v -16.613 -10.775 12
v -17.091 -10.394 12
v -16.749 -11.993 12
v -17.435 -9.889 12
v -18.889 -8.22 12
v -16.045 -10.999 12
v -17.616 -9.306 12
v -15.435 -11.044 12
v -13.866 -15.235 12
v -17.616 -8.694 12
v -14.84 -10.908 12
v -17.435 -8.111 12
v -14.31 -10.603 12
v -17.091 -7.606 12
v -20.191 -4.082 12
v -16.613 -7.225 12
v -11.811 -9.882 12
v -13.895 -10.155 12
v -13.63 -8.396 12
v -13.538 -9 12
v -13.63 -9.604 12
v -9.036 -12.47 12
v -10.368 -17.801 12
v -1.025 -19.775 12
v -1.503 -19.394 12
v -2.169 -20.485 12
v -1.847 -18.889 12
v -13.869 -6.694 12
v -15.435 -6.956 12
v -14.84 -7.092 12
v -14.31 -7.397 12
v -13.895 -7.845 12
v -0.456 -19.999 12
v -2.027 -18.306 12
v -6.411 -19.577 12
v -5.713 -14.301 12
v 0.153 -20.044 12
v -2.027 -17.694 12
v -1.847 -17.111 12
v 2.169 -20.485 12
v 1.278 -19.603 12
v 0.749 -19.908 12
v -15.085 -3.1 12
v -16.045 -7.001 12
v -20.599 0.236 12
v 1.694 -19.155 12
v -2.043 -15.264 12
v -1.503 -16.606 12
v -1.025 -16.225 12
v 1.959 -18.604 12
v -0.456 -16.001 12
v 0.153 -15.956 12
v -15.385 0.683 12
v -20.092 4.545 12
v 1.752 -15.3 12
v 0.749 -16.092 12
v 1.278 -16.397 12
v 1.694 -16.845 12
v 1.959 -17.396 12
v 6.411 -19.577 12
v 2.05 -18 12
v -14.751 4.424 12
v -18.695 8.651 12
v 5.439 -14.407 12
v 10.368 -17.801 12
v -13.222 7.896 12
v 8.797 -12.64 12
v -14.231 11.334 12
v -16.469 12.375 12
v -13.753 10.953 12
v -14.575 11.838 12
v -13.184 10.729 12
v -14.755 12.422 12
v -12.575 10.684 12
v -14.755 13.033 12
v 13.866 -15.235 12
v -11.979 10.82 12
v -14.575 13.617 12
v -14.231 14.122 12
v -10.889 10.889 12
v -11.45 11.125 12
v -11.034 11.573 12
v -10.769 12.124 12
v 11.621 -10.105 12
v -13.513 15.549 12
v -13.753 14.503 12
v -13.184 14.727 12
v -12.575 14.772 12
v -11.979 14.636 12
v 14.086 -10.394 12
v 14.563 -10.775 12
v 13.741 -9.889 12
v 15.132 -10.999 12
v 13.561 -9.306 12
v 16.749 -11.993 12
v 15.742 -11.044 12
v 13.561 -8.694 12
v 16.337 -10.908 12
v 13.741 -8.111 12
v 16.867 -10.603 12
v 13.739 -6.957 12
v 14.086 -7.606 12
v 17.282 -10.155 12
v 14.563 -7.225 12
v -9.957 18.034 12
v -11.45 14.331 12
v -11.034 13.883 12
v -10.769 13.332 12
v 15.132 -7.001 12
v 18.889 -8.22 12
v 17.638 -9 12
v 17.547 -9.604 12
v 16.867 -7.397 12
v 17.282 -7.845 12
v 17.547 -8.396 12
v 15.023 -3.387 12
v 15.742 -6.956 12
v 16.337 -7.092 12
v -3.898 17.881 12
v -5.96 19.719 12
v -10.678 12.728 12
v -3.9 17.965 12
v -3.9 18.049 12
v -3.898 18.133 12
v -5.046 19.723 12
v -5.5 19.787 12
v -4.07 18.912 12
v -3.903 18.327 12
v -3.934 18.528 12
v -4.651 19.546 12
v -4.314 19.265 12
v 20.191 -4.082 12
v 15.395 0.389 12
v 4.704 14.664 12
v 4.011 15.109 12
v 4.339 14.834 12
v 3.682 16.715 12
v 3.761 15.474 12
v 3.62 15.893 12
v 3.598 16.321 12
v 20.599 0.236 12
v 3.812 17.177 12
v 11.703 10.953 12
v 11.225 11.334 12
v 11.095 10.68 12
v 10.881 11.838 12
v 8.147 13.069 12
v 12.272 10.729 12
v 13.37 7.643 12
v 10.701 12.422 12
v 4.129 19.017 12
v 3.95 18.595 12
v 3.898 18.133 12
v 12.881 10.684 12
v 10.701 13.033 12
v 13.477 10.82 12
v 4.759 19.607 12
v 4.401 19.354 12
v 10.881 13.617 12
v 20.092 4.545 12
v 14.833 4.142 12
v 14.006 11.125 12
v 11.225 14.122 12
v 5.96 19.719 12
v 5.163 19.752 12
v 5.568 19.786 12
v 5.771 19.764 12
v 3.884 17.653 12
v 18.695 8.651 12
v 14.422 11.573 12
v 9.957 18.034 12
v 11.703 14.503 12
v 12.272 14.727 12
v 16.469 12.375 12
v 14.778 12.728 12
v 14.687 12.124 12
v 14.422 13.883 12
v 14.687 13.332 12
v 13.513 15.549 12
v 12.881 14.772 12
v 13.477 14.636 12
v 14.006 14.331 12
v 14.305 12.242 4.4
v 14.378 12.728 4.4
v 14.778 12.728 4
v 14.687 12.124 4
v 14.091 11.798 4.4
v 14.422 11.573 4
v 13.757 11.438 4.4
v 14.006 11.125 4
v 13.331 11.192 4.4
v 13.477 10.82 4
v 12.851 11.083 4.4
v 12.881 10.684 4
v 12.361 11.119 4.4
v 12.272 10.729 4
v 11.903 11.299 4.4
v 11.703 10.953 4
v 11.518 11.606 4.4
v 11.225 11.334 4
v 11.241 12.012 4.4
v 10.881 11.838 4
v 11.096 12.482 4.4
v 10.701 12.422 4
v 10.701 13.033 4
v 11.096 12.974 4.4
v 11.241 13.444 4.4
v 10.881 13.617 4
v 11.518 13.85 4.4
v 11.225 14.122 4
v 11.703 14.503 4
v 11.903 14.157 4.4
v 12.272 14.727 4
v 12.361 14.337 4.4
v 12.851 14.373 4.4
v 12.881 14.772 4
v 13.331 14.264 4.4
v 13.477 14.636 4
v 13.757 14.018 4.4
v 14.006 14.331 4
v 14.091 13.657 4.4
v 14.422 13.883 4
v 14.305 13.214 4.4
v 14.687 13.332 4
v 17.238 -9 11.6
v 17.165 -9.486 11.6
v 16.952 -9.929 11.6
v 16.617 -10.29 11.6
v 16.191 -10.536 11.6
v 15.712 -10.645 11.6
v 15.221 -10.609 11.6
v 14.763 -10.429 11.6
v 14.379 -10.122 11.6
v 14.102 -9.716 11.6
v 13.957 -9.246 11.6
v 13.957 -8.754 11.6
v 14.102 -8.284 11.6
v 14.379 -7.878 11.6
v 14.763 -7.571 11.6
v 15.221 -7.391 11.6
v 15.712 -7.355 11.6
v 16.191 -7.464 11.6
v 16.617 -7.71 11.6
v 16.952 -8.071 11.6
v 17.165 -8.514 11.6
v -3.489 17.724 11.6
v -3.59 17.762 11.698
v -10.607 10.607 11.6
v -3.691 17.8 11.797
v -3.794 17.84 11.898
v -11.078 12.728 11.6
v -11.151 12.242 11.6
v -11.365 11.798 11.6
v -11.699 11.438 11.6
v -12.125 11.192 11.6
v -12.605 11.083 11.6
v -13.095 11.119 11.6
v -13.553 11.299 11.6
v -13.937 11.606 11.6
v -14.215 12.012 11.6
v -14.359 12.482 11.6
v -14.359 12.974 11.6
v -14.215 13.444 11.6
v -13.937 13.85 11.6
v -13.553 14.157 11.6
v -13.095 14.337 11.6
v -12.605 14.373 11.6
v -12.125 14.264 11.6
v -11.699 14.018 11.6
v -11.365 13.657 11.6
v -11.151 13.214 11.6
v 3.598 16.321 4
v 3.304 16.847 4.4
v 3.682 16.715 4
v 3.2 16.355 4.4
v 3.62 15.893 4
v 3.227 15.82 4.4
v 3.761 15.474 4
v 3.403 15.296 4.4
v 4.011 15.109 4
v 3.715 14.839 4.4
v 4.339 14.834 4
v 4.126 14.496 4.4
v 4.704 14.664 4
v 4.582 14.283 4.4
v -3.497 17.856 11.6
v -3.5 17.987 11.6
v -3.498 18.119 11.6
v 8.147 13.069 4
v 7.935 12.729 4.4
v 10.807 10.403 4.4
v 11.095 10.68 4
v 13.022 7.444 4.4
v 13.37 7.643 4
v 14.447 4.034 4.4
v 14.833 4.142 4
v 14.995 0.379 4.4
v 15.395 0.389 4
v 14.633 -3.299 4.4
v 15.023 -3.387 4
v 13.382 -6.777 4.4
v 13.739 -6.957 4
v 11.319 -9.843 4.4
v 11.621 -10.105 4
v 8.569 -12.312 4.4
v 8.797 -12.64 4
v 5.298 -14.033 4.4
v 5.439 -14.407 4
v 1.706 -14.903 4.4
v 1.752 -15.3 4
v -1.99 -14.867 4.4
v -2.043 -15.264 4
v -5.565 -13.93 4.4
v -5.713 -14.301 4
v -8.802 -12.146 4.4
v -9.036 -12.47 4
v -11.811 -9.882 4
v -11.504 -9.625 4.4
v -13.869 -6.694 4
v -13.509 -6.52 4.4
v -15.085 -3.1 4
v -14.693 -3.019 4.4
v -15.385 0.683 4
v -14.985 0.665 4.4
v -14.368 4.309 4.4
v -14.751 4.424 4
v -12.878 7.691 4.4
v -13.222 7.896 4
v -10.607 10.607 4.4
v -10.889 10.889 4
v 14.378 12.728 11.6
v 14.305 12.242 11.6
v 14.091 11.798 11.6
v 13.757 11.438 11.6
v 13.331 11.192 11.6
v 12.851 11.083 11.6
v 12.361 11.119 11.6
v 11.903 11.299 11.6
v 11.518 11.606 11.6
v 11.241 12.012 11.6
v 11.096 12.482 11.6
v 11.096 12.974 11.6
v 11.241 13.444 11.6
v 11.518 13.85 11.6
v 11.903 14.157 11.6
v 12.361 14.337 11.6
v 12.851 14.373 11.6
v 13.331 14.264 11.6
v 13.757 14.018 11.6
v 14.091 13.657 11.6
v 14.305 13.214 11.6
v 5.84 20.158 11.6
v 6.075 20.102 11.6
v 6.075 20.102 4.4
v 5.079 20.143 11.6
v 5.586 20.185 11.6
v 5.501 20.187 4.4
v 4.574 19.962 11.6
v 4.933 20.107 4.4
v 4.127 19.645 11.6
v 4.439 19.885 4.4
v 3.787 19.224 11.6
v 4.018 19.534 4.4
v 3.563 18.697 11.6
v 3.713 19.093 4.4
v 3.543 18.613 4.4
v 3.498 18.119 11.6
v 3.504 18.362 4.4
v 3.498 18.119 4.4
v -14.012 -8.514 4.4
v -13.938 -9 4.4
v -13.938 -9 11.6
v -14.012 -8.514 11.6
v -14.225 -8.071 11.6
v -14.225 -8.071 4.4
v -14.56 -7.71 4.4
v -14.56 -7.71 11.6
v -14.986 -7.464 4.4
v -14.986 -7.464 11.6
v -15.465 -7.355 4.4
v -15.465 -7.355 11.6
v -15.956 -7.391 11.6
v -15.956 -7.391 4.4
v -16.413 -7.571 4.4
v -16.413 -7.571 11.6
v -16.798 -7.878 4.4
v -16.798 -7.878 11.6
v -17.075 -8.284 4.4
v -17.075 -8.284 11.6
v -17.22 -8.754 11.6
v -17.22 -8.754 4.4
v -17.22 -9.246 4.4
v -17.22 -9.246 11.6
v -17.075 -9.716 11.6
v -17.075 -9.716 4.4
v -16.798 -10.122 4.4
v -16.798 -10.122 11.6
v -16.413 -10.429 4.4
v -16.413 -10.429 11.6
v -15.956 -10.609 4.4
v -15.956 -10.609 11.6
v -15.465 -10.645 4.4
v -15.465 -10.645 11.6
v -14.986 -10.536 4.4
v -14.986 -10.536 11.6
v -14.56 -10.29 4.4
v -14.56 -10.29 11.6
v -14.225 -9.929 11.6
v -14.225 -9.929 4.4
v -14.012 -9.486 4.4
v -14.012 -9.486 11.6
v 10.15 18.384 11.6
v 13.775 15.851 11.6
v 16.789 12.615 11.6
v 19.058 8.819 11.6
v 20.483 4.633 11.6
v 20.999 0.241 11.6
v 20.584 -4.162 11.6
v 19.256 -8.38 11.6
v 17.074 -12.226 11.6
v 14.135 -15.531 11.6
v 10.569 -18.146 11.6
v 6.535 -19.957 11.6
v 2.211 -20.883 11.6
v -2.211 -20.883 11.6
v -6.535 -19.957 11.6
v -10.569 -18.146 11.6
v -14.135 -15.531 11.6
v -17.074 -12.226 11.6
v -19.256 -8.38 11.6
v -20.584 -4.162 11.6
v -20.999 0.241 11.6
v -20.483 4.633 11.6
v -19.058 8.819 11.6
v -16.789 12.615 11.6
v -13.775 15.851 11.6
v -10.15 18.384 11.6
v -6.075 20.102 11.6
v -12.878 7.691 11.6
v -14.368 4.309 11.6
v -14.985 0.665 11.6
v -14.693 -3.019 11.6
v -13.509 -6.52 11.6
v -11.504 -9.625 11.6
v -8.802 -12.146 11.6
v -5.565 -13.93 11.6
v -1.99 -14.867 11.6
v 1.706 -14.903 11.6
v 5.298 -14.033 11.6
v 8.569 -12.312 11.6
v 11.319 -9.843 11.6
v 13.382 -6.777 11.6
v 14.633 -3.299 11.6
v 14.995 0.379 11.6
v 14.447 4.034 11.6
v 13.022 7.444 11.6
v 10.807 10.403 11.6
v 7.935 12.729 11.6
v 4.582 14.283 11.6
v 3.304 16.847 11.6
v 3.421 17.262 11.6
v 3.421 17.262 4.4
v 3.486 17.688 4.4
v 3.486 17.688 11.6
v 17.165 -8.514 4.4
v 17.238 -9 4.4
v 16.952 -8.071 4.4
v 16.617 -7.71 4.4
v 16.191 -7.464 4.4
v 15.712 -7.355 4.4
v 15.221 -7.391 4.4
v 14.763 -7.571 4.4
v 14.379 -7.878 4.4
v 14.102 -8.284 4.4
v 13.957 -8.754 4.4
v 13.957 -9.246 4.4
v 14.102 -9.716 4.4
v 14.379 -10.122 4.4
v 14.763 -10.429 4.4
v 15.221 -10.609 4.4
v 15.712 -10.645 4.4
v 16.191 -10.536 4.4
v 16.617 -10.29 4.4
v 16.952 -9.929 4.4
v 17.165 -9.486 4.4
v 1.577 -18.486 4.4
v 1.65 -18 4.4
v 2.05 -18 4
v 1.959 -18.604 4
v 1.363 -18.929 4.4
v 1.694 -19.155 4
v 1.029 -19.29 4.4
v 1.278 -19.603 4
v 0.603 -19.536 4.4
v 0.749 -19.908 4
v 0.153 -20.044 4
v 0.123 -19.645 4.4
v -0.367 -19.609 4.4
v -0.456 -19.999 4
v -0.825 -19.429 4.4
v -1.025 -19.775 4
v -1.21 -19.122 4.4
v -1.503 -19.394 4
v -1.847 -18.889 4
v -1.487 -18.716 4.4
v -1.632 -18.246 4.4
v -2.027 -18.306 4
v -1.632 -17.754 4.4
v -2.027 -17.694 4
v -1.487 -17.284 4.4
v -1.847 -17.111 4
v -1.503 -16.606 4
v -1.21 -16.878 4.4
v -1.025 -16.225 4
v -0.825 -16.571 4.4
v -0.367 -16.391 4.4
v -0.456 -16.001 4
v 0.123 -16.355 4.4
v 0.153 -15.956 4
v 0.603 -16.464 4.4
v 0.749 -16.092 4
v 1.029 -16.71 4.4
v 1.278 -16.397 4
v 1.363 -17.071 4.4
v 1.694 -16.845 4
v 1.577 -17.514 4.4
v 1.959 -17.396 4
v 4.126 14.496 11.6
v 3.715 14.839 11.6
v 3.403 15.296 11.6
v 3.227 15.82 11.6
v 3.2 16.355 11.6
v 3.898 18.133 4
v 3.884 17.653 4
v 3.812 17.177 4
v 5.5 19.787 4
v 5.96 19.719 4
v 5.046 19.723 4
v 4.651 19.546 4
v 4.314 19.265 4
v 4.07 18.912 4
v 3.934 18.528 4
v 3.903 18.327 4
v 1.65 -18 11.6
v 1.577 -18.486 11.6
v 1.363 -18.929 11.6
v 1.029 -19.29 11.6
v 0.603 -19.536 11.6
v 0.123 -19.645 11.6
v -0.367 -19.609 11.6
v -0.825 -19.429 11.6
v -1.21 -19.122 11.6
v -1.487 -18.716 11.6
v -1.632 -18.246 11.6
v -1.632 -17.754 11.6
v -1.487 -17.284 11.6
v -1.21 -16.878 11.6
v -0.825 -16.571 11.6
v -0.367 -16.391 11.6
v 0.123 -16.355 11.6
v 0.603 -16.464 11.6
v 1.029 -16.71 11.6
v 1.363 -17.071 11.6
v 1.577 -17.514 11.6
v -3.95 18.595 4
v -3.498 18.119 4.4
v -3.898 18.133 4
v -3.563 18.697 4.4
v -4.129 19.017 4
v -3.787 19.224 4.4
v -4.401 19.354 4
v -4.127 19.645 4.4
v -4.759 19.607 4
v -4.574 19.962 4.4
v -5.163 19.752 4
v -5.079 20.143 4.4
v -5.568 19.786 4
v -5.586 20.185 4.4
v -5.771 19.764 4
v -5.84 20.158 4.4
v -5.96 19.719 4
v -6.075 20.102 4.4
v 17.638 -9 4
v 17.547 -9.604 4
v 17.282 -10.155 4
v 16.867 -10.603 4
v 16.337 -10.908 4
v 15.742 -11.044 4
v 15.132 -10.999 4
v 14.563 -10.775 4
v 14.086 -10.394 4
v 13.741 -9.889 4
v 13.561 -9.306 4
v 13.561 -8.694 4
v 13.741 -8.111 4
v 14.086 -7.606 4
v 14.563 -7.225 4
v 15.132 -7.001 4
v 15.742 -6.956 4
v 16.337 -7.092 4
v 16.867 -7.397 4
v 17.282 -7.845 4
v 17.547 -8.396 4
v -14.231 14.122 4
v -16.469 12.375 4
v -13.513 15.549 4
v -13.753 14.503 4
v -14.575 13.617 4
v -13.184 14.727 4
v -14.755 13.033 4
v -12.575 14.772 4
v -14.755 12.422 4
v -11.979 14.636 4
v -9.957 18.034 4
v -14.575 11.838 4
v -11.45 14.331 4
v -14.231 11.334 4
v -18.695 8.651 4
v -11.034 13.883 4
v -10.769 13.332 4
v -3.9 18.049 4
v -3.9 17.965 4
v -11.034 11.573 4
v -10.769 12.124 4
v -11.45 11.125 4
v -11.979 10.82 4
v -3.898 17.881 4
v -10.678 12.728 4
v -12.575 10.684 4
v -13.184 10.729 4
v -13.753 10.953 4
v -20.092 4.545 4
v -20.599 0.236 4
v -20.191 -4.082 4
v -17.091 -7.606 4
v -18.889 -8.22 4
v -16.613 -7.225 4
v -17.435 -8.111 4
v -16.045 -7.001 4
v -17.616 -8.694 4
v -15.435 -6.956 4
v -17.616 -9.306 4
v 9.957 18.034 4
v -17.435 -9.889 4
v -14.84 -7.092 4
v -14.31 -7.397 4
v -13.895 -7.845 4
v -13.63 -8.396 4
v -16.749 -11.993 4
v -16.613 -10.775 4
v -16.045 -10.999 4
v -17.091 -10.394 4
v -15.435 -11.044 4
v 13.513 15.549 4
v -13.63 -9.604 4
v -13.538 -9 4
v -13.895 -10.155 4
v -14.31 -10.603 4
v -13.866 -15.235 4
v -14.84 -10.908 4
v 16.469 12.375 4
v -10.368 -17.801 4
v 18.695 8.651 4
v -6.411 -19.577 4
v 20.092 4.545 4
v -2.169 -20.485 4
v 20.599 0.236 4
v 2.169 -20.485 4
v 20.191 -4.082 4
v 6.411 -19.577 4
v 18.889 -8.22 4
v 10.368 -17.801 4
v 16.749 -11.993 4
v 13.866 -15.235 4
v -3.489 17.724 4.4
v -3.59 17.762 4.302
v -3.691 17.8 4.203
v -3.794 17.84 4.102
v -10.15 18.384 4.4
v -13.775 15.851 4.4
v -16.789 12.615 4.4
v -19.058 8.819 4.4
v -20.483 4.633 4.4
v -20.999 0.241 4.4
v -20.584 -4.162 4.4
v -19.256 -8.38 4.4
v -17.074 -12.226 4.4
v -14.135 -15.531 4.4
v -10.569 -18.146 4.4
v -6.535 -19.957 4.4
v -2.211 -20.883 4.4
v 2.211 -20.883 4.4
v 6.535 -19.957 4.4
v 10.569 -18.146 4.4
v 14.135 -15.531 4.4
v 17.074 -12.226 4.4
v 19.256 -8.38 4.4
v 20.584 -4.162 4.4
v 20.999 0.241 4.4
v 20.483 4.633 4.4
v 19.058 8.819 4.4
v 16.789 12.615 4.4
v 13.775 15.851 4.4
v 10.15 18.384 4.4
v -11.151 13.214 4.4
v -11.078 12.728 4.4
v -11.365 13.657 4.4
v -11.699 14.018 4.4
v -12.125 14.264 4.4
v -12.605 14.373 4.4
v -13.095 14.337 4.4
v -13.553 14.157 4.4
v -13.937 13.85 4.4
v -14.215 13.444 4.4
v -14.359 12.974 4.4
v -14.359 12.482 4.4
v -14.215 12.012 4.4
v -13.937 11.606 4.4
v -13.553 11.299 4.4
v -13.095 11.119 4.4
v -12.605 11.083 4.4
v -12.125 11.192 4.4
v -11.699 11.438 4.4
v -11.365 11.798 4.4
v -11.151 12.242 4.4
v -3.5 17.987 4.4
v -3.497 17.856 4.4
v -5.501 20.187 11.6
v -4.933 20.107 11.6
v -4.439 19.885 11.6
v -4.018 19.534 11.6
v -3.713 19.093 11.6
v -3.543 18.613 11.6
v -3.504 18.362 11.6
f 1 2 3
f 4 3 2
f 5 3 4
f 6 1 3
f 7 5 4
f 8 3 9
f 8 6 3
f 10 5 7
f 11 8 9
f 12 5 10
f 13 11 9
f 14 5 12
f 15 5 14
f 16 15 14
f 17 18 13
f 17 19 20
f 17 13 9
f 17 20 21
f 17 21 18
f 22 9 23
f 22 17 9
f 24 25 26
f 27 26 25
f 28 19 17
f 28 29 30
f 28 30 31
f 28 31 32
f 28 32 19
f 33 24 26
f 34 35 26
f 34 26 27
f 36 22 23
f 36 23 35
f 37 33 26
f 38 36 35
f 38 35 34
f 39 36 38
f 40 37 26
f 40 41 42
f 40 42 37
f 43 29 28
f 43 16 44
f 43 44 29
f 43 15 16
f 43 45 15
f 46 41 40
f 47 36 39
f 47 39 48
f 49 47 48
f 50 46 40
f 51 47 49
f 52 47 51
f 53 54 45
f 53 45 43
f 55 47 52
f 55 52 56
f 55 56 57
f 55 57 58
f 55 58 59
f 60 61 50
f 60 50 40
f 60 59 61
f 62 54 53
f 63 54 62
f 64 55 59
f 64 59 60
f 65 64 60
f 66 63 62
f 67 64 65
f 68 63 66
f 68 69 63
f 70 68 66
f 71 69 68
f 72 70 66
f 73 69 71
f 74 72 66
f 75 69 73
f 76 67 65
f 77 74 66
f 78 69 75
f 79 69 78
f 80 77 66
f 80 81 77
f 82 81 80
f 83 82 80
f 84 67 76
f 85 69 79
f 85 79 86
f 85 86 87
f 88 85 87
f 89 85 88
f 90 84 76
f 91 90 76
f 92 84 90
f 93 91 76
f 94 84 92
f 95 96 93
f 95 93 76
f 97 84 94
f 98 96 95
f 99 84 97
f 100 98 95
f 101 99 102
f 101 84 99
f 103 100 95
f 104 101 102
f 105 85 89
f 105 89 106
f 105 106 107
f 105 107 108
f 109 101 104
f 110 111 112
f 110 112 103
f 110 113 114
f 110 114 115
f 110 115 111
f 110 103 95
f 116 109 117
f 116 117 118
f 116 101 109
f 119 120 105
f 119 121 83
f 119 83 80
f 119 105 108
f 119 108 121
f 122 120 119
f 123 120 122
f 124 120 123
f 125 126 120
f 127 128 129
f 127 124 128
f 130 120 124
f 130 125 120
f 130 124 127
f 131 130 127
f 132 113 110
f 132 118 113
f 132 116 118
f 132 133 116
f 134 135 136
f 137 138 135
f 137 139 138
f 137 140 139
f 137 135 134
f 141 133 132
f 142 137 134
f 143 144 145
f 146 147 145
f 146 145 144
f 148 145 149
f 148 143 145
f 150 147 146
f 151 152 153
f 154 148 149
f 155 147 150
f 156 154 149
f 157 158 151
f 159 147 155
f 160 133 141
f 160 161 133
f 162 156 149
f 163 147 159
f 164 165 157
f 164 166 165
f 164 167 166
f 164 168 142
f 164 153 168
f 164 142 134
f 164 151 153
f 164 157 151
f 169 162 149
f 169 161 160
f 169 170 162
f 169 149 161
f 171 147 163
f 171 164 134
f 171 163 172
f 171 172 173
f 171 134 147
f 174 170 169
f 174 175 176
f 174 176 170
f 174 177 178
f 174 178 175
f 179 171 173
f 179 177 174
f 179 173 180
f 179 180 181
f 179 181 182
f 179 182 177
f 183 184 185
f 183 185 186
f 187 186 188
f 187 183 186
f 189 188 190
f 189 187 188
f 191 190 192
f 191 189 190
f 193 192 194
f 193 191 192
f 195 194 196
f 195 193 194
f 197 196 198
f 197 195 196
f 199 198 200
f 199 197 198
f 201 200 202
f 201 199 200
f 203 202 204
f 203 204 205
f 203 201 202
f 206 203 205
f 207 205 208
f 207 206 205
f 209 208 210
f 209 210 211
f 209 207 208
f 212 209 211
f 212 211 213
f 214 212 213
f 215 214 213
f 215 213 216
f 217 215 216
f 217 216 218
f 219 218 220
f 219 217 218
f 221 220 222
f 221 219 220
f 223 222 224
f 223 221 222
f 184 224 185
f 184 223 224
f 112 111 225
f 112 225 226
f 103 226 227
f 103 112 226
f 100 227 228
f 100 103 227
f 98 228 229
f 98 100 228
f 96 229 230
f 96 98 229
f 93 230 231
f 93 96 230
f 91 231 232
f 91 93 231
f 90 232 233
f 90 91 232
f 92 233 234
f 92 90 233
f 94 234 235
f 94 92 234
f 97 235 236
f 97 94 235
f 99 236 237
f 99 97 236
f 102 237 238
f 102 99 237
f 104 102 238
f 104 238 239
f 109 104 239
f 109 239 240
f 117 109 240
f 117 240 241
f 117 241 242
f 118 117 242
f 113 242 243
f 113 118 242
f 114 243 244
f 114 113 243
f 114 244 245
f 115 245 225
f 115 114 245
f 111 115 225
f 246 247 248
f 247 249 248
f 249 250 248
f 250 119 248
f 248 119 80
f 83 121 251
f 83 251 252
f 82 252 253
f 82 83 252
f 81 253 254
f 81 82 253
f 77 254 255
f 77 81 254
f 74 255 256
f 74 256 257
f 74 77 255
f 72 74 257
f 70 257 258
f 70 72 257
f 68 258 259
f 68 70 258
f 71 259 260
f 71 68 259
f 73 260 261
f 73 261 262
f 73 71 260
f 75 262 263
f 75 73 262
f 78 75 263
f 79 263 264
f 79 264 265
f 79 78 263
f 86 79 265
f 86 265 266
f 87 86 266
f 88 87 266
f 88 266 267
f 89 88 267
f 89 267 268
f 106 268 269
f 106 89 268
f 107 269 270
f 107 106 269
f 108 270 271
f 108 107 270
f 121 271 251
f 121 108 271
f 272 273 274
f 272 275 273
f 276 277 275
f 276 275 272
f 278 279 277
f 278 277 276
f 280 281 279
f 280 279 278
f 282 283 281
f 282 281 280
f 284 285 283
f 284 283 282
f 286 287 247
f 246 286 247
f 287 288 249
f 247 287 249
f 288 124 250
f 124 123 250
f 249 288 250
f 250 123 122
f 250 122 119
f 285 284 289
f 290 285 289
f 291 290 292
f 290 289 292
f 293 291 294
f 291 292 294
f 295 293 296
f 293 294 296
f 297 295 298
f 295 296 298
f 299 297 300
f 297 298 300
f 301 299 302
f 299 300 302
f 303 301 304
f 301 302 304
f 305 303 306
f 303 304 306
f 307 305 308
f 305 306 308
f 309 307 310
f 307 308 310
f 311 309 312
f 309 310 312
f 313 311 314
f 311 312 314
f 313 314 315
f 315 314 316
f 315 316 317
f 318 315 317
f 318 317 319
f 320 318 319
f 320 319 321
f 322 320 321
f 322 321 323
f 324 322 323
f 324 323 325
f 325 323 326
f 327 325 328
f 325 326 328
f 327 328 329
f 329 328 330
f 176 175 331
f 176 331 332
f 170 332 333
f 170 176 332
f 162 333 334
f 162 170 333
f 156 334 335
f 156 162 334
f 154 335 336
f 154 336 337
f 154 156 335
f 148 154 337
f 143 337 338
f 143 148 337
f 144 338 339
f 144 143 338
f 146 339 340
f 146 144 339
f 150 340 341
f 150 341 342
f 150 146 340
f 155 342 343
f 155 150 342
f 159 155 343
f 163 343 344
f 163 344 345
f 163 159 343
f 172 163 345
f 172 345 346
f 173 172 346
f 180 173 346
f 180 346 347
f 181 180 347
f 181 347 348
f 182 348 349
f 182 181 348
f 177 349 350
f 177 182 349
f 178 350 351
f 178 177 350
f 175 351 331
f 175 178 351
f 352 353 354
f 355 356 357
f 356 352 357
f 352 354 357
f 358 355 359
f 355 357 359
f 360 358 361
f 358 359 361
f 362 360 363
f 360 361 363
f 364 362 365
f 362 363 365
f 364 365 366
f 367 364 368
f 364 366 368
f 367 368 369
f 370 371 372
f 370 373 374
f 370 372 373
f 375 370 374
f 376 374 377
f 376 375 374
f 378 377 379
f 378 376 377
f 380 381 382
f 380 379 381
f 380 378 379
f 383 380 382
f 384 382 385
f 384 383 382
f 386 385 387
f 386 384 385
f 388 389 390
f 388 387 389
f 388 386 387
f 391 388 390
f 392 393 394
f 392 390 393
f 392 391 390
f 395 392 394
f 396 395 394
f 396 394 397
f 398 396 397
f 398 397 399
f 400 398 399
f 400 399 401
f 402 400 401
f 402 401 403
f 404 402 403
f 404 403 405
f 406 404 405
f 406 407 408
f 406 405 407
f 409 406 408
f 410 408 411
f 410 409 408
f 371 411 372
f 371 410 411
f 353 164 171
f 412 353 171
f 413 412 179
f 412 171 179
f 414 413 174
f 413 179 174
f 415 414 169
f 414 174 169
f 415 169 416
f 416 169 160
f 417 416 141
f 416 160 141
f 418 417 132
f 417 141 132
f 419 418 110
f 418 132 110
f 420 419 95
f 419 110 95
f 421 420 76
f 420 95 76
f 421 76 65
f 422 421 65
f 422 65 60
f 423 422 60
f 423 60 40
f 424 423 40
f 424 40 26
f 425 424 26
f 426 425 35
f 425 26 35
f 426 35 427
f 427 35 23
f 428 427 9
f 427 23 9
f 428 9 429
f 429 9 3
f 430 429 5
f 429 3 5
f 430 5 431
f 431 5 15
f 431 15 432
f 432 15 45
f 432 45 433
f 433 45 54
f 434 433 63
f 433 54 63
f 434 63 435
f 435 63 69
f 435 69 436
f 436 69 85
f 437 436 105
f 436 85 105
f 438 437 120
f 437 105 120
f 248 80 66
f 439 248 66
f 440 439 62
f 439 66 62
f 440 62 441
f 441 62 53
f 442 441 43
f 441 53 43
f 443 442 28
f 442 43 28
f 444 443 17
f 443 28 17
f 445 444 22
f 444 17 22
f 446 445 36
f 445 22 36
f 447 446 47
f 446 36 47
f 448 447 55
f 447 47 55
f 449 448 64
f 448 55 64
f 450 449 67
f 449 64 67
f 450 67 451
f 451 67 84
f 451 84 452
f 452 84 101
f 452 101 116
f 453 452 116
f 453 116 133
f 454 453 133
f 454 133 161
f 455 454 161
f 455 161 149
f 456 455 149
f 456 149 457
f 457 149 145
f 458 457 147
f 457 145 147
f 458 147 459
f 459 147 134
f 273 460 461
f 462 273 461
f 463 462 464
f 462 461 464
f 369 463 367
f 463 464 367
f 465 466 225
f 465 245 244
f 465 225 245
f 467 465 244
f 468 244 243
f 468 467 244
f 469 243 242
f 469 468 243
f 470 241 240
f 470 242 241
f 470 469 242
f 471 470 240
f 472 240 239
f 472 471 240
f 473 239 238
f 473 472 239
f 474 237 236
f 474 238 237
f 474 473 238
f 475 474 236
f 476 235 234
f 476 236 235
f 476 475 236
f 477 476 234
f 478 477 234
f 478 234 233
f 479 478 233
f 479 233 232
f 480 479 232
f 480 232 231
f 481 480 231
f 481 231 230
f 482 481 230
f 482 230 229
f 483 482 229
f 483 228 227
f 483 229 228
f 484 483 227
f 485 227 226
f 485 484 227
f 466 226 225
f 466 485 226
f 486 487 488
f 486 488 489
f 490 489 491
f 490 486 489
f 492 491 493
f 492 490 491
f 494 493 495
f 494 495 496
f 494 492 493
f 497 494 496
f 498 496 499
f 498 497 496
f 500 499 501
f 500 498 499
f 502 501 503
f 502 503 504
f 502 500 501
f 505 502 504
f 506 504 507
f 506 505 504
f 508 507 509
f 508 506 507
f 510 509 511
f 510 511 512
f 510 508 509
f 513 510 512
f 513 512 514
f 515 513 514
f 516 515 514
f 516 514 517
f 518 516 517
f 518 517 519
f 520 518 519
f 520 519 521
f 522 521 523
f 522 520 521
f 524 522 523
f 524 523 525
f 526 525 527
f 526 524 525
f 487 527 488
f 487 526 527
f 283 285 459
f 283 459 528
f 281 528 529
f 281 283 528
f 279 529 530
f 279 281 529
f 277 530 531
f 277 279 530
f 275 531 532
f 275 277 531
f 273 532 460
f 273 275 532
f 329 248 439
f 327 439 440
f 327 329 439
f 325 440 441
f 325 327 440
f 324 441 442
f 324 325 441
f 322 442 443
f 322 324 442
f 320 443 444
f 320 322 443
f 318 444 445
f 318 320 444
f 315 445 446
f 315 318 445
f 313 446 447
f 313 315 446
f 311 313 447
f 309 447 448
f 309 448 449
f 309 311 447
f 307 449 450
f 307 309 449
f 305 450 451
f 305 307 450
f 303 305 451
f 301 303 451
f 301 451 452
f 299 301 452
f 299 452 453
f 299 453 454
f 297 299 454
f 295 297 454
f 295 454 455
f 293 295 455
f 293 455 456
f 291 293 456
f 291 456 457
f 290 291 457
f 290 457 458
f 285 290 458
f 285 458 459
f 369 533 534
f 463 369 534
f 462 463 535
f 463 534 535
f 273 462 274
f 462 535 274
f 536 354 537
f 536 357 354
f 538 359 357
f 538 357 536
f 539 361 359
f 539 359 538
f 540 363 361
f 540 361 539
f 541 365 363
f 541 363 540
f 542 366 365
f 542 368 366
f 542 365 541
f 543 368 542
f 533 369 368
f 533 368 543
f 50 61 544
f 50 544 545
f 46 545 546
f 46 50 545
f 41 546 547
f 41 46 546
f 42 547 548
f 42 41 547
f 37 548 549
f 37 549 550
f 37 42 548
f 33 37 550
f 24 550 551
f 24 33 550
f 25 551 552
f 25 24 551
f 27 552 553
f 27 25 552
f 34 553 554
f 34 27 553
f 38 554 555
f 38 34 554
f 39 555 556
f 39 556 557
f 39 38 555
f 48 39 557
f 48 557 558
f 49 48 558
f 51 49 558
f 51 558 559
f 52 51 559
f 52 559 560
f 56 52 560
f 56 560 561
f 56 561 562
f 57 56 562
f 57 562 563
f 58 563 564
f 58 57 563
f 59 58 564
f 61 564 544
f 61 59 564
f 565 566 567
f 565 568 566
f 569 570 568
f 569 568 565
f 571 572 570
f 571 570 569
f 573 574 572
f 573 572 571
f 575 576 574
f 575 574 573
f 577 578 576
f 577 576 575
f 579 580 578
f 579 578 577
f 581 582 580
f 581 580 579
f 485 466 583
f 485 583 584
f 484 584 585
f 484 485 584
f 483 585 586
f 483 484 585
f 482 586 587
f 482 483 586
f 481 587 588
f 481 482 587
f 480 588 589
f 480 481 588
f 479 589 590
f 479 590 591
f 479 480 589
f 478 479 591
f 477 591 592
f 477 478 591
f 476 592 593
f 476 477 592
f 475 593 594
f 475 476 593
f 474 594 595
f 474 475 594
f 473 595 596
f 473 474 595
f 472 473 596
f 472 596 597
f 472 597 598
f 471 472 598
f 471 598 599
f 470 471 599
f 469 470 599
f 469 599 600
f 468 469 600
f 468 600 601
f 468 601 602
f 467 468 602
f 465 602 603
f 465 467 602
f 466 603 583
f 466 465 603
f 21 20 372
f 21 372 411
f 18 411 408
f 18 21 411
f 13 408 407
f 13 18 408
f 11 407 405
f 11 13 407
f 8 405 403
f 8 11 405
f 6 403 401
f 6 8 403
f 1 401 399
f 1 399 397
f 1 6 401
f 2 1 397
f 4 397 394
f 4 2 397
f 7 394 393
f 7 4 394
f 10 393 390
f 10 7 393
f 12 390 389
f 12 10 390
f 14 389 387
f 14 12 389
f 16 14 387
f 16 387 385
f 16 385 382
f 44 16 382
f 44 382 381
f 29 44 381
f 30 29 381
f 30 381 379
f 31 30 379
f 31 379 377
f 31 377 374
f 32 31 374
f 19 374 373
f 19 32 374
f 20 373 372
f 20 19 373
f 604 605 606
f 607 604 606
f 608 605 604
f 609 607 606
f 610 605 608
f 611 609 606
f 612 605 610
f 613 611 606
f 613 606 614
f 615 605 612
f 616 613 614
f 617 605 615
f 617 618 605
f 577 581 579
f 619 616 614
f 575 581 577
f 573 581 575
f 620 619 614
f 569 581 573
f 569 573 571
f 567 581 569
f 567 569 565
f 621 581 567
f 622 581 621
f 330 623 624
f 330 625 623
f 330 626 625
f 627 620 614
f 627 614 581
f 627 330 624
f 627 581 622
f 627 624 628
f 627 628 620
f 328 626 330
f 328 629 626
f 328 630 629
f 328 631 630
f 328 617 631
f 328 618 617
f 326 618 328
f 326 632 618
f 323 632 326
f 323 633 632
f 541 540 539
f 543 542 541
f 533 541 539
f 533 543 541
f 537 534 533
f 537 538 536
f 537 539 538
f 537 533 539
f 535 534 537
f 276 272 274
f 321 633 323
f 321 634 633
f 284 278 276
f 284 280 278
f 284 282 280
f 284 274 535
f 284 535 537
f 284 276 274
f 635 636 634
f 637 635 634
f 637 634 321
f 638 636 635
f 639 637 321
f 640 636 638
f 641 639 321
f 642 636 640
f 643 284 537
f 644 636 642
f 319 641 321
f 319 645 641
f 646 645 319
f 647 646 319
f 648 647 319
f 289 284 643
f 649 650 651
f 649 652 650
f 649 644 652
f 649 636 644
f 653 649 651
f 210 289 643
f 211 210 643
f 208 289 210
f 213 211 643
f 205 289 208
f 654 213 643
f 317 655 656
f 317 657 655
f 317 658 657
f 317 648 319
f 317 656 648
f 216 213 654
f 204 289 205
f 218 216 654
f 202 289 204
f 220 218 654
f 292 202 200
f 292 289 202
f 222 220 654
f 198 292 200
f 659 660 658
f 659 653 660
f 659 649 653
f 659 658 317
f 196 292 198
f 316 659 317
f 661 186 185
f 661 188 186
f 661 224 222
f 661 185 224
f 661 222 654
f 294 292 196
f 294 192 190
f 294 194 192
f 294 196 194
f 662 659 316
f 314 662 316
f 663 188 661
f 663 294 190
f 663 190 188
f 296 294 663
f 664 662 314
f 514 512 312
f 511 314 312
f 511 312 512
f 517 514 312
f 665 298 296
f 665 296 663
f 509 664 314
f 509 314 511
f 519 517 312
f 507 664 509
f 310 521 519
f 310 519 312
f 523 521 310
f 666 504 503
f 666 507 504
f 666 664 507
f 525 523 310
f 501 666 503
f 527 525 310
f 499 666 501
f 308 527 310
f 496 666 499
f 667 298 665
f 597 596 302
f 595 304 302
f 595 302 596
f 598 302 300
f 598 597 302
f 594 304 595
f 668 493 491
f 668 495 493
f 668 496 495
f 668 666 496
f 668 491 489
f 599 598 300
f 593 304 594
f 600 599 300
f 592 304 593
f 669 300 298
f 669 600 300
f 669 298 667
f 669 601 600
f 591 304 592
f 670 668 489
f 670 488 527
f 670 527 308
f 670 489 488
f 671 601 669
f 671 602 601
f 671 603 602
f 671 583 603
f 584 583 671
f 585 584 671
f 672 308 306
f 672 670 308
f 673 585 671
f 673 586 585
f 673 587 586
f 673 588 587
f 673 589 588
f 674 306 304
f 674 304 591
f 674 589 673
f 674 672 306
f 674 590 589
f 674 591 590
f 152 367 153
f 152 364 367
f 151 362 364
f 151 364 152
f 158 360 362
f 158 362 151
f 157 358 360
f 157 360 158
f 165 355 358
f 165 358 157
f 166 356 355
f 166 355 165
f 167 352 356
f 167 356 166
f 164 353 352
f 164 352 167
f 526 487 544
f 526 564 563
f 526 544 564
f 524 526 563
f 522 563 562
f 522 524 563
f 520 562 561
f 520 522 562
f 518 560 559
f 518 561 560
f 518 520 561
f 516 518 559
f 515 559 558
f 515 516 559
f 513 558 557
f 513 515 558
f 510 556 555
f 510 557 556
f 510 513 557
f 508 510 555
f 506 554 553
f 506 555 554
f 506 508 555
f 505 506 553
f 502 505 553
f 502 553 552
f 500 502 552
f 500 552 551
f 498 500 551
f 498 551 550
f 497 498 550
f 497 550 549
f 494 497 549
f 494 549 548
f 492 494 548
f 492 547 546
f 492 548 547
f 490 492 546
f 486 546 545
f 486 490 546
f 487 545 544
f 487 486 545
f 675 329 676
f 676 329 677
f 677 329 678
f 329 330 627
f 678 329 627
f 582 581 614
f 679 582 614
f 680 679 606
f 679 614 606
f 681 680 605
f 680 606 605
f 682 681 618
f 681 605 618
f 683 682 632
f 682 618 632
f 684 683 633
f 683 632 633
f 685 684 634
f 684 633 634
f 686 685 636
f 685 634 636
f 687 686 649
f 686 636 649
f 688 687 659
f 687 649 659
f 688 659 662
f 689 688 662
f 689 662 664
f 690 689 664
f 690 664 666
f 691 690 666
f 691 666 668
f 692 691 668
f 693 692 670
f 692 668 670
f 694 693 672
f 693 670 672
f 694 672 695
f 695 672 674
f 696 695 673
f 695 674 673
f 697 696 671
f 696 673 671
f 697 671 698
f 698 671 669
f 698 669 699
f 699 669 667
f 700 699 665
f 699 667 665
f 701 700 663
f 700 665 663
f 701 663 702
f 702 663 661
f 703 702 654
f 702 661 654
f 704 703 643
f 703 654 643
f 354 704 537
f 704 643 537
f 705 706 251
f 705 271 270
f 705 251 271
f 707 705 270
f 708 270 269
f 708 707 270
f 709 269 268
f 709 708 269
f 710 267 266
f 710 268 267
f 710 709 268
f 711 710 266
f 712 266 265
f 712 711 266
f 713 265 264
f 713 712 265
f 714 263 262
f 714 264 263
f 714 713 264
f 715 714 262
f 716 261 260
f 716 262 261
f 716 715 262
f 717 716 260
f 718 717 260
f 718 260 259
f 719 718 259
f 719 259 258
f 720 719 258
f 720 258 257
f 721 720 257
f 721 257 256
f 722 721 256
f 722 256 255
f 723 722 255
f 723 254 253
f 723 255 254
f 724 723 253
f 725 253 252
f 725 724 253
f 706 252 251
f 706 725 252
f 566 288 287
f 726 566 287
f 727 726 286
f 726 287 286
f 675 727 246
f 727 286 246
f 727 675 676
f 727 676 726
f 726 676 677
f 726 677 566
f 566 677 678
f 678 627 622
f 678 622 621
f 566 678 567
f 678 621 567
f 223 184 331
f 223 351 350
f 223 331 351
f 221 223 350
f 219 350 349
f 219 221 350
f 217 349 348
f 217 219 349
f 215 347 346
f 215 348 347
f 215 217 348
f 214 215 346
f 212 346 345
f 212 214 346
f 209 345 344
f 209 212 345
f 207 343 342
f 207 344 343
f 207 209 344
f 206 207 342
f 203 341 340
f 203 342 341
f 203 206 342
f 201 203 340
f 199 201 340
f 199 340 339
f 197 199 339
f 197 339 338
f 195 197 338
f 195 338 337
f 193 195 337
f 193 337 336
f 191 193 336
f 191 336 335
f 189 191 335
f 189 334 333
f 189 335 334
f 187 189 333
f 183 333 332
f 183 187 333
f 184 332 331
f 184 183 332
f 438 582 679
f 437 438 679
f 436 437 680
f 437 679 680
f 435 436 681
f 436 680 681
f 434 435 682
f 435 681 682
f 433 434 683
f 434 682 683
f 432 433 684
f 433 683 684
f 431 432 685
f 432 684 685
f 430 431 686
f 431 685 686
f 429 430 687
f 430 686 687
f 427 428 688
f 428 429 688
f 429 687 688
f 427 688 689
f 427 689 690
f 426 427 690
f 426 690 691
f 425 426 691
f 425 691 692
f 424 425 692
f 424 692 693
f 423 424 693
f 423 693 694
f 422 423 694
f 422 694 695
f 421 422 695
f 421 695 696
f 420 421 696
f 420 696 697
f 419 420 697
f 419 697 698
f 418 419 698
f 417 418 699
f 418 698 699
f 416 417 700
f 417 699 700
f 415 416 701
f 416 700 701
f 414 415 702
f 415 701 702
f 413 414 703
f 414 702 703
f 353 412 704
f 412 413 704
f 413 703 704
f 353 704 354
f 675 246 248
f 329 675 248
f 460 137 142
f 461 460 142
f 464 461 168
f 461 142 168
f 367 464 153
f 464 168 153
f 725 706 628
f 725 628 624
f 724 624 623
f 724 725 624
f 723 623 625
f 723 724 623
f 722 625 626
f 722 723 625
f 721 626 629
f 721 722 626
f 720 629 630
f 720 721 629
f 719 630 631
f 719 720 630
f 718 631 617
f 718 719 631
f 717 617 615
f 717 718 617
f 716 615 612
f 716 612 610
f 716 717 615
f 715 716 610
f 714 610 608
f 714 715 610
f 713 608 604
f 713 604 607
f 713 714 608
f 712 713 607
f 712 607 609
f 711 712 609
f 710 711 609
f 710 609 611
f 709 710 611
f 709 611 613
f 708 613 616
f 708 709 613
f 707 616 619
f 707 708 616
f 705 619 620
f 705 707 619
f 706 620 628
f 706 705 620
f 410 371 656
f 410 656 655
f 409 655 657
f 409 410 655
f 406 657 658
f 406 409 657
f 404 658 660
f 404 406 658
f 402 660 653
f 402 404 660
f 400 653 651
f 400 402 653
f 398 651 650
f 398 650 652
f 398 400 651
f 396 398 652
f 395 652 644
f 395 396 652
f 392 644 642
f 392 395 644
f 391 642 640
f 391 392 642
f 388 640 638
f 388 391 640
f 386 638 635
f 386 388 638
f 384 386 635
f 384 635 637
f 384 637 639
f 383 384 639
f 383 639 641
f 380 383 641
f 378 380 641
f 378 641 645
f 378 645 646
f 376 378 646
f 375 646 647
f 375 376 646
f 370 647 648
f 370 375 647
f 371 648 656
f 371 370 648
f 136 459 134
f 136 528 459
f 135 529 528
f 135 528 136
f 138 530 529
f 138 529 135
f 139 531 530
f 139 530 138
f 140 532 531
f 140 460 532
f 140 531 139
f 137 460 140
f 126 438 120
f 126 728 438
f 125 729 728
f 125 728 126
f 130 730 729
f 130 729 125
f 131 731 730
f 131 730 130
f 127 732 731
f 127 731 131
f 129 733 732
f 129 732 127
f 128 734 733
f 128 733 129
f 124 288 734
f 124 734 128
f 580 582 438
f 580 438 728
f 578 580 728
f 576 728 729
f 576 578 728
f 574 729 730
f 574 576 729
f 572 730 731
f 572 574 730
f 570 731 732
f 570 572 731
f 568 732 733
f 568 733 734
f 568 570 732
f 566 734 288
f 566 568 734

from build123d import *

# Parameters (mm, degrees)
SKETCH_R                    = 21
PAD_DEPTH                   = 14
SKETCH001_R                 = 9.05
POCKET_DEPTH                = 4
SKETCH002_R                 = 8.05
POCKET001_DEPTH             = 14.001
SKETCH003_R                 = 15
POCKET002_DEPTH             = 8.001
POCKET003_DEPTH             = 8
SKETCH005_R                 = 3.5
POCKET004_DEPTH             = 8
FILLET_R                    = 2
SKETCH006_R                 = 4
PAD001_DEPTH                = 6
SKETCH007_R                 = 1.65
POCKET005_DEPTH             = 14.001
SKETCH046_R                 = 25
POCKET031_DEPTH             = 6
CHAMFER003068012002052_SIZE = 0.4


with BuildPart() as part:
    # Sketch → Pad (new body)
    with BuildSketch(Plane.XY):
        Circle(SKETCH_R)
    extrude(amount=PAD_DEPTH)

    # Sketch001 (on DatumPlane) → Pocket (cut)
    with BuildSketch(Plane.XY):
        Circle(SKETCH001_R)
    extrude(amount=POCKET_DEPTH, mode=Mode.SUBTRACT)

    # Sketch002 (on DatumPlane) → Pocket001 (cut, through all)
    with BuildSketch(Plane.XY):
        Circle(SKETCH002_R)
    extrude(amount=POCKET001_DEPTH, mode=Mode.SUBTRACT)

    # Sketch003 (on DatumPlane) → Pocket002 (cut, through all)
    with BuildSketch(Plane.XY.offset(6)):
        Circle(SKETCH003_R)
    extrude(amount=POCKET002_DEPTH, mode=Mode.SUBTRACT)

    # Sketch004 (on DatumPlane) → Pocket003 (cut)
    with BuildSketch(Plane.XY.offset(14)):
        Polygon((-10.606602, 10.606602), (0, 10.606602), (0, 21.213203), align=None)
    extrude(amount=-POCKET003_DEPTH, mode=Mode.SUBTRACT)

    # Sketch005 (on DatumPlane) → Pocket004 (cut)
    with BuildSketch(Plane.XY.offset(14)):
        with Locations((0, 18)):
            Circle(SKETCH005_R)
    extrude(amount=-POCKET004_DEPTH, mode=Mode.SUBTRACT)

    # Fillet
    fillet_edges = [part.edges().sort_by_distance(p)[0] for p in [
        (-1.945126, 20.909722, 10),
        (1.945126, 20.909722, 10),
        (1.643223, 14.909722, 10),
    ]]
    fillet(fillet_edges, radius=FILLET_R)

    # Sketch006 (on DatumPlane) → Pad001 (join)
    with BuildSketch(Plane.XY):
        with Locations((0, 18)):
            Circle(SKETCH006_R)
        with Locations((-12.727922, 12.727922)):
            Circle(SKETCH006_R)
        with Locations((12.727922, 12.727922)):
            Circle(SKETCH006_R)
        with Locations((-15.588457, -9)):
            Circle(SKETCH006_R)
        with Locations((15.588457, -9)):
            Circle(SKETCH006_R)
    extrude(amount=PAD001_DEPTH)

    # Sketch007 (on DatumPlane) → Pocket005 (cut, through all)
    with BuildSketch(Plane.XY):
        with Locations((-12.727922, 12.727922)):
            Circle(SKETCH007_R)
        with Locations((12.727922, 12.727922)):
            Circle(SKETCH007_R)
        with Locations((0, 18)):
            Circle(SKETCH007_R)
        with Locations((-15.588457, -9)):
            Circle(SKETCH007_R)
        with Locations((15.588457, -9)):
            Circle(SKETCH007_R)
        with Locations((0, -18)):
            Circle(SKETCH007_R)
    extrude(amount=POCKET005_DEPTH, mode=Mode.SUBTRACT)

    # Sketch046 (on Face5 of Pocket005) → Pocket031 (cut)
    with BuildSketch(Plane(origin=(0, 0, 0), x_dir=(1, 0, 0), z_dir=(0, 0, -1))):
        Circle(SKETCH046_R)
    extrude(amount=-POCKET031_DEPTH, mode=Mode.SUBTRACT)

    # Chamfer003068012002052
    chamfer003068012002052_edges = [part.edges().sort_by_distance(p)[0] for p in [
        (-3.499121, 17.921582, 14),
        (-4.27738, 19.772747, 14),
        (-7.047855, 14.165348, 14),
        (-12.518313, -16.860956, 14),
        (-5.740251, -13.858193, 14),
        (16.860956, 12.518313, 14),
        (12.118742, 8.839462, 14),
        (4.27738, 19.772747, 14),
        (3.402691, 15.295524, 14),
        (3.499491, 18.059668, 14),
        (3.450776, 17.415069, 14),
        (-1.65, -18, 14),
        (-17.238457, -9, 14),
        (13.938457, -9, 14),
        (-14.377922, 12.727922, 14),
        (11.077922, 12.727922, 14),
        (-9.535985, 18.710024, 6),
        (-14.849242, 14.849242, 6),
        (-20.820342, 2.74105, 6),
        (-18.186533, -10.5, 6),
        (0, -21, 6),
        (18.186533, -10.5, 6),
        (20.607252, -4.042422, 6),
        (19.903312, 6.697625, 6),
        (14.849242, 14.849242, 6),
        (9.535985, 18.710024, 6),
        (4.27738, 19.772747, 6),
        (3.499491, 18.059668, 6),
        (3.450776, 17.415069, 6),
        (3.402691, 15.295524, 6),
        (6.75734, 13.391727, 6),
        (10.606602, 10.606602, 6),
        (14.275343, 4.605928, 6),
        (14.75441, -2.703217, 6),
        (12.990381, -7.5, 6),
        (0, -15, 6),
        (-12.990381, -7.5, 6),
        (-14.871673, 1.957893, 6),
        (-11.426085, 9.71826, 6),
        (-7.047855, 14.165348, 6),
        (-3.499121, 17.921582, 6),
        (-4.27738, 19.772747, 6),
        (13.938457, -9, 6),
        (-1.65, -18, 6),
        (-17.238457, -9, 6),
        (11.077922, 12.727922, 6),
        (-14.377922, 12.727922, 6),
    ]]
    chamfer(chamfer003068012002052_edges, length=CHAMFER003068012002052_SIZE)


with BuildPart() as part_1:
    # Body placement: moved
    add(part.part.moved(Location((0, 0, -2))))


solid = part_1.part
